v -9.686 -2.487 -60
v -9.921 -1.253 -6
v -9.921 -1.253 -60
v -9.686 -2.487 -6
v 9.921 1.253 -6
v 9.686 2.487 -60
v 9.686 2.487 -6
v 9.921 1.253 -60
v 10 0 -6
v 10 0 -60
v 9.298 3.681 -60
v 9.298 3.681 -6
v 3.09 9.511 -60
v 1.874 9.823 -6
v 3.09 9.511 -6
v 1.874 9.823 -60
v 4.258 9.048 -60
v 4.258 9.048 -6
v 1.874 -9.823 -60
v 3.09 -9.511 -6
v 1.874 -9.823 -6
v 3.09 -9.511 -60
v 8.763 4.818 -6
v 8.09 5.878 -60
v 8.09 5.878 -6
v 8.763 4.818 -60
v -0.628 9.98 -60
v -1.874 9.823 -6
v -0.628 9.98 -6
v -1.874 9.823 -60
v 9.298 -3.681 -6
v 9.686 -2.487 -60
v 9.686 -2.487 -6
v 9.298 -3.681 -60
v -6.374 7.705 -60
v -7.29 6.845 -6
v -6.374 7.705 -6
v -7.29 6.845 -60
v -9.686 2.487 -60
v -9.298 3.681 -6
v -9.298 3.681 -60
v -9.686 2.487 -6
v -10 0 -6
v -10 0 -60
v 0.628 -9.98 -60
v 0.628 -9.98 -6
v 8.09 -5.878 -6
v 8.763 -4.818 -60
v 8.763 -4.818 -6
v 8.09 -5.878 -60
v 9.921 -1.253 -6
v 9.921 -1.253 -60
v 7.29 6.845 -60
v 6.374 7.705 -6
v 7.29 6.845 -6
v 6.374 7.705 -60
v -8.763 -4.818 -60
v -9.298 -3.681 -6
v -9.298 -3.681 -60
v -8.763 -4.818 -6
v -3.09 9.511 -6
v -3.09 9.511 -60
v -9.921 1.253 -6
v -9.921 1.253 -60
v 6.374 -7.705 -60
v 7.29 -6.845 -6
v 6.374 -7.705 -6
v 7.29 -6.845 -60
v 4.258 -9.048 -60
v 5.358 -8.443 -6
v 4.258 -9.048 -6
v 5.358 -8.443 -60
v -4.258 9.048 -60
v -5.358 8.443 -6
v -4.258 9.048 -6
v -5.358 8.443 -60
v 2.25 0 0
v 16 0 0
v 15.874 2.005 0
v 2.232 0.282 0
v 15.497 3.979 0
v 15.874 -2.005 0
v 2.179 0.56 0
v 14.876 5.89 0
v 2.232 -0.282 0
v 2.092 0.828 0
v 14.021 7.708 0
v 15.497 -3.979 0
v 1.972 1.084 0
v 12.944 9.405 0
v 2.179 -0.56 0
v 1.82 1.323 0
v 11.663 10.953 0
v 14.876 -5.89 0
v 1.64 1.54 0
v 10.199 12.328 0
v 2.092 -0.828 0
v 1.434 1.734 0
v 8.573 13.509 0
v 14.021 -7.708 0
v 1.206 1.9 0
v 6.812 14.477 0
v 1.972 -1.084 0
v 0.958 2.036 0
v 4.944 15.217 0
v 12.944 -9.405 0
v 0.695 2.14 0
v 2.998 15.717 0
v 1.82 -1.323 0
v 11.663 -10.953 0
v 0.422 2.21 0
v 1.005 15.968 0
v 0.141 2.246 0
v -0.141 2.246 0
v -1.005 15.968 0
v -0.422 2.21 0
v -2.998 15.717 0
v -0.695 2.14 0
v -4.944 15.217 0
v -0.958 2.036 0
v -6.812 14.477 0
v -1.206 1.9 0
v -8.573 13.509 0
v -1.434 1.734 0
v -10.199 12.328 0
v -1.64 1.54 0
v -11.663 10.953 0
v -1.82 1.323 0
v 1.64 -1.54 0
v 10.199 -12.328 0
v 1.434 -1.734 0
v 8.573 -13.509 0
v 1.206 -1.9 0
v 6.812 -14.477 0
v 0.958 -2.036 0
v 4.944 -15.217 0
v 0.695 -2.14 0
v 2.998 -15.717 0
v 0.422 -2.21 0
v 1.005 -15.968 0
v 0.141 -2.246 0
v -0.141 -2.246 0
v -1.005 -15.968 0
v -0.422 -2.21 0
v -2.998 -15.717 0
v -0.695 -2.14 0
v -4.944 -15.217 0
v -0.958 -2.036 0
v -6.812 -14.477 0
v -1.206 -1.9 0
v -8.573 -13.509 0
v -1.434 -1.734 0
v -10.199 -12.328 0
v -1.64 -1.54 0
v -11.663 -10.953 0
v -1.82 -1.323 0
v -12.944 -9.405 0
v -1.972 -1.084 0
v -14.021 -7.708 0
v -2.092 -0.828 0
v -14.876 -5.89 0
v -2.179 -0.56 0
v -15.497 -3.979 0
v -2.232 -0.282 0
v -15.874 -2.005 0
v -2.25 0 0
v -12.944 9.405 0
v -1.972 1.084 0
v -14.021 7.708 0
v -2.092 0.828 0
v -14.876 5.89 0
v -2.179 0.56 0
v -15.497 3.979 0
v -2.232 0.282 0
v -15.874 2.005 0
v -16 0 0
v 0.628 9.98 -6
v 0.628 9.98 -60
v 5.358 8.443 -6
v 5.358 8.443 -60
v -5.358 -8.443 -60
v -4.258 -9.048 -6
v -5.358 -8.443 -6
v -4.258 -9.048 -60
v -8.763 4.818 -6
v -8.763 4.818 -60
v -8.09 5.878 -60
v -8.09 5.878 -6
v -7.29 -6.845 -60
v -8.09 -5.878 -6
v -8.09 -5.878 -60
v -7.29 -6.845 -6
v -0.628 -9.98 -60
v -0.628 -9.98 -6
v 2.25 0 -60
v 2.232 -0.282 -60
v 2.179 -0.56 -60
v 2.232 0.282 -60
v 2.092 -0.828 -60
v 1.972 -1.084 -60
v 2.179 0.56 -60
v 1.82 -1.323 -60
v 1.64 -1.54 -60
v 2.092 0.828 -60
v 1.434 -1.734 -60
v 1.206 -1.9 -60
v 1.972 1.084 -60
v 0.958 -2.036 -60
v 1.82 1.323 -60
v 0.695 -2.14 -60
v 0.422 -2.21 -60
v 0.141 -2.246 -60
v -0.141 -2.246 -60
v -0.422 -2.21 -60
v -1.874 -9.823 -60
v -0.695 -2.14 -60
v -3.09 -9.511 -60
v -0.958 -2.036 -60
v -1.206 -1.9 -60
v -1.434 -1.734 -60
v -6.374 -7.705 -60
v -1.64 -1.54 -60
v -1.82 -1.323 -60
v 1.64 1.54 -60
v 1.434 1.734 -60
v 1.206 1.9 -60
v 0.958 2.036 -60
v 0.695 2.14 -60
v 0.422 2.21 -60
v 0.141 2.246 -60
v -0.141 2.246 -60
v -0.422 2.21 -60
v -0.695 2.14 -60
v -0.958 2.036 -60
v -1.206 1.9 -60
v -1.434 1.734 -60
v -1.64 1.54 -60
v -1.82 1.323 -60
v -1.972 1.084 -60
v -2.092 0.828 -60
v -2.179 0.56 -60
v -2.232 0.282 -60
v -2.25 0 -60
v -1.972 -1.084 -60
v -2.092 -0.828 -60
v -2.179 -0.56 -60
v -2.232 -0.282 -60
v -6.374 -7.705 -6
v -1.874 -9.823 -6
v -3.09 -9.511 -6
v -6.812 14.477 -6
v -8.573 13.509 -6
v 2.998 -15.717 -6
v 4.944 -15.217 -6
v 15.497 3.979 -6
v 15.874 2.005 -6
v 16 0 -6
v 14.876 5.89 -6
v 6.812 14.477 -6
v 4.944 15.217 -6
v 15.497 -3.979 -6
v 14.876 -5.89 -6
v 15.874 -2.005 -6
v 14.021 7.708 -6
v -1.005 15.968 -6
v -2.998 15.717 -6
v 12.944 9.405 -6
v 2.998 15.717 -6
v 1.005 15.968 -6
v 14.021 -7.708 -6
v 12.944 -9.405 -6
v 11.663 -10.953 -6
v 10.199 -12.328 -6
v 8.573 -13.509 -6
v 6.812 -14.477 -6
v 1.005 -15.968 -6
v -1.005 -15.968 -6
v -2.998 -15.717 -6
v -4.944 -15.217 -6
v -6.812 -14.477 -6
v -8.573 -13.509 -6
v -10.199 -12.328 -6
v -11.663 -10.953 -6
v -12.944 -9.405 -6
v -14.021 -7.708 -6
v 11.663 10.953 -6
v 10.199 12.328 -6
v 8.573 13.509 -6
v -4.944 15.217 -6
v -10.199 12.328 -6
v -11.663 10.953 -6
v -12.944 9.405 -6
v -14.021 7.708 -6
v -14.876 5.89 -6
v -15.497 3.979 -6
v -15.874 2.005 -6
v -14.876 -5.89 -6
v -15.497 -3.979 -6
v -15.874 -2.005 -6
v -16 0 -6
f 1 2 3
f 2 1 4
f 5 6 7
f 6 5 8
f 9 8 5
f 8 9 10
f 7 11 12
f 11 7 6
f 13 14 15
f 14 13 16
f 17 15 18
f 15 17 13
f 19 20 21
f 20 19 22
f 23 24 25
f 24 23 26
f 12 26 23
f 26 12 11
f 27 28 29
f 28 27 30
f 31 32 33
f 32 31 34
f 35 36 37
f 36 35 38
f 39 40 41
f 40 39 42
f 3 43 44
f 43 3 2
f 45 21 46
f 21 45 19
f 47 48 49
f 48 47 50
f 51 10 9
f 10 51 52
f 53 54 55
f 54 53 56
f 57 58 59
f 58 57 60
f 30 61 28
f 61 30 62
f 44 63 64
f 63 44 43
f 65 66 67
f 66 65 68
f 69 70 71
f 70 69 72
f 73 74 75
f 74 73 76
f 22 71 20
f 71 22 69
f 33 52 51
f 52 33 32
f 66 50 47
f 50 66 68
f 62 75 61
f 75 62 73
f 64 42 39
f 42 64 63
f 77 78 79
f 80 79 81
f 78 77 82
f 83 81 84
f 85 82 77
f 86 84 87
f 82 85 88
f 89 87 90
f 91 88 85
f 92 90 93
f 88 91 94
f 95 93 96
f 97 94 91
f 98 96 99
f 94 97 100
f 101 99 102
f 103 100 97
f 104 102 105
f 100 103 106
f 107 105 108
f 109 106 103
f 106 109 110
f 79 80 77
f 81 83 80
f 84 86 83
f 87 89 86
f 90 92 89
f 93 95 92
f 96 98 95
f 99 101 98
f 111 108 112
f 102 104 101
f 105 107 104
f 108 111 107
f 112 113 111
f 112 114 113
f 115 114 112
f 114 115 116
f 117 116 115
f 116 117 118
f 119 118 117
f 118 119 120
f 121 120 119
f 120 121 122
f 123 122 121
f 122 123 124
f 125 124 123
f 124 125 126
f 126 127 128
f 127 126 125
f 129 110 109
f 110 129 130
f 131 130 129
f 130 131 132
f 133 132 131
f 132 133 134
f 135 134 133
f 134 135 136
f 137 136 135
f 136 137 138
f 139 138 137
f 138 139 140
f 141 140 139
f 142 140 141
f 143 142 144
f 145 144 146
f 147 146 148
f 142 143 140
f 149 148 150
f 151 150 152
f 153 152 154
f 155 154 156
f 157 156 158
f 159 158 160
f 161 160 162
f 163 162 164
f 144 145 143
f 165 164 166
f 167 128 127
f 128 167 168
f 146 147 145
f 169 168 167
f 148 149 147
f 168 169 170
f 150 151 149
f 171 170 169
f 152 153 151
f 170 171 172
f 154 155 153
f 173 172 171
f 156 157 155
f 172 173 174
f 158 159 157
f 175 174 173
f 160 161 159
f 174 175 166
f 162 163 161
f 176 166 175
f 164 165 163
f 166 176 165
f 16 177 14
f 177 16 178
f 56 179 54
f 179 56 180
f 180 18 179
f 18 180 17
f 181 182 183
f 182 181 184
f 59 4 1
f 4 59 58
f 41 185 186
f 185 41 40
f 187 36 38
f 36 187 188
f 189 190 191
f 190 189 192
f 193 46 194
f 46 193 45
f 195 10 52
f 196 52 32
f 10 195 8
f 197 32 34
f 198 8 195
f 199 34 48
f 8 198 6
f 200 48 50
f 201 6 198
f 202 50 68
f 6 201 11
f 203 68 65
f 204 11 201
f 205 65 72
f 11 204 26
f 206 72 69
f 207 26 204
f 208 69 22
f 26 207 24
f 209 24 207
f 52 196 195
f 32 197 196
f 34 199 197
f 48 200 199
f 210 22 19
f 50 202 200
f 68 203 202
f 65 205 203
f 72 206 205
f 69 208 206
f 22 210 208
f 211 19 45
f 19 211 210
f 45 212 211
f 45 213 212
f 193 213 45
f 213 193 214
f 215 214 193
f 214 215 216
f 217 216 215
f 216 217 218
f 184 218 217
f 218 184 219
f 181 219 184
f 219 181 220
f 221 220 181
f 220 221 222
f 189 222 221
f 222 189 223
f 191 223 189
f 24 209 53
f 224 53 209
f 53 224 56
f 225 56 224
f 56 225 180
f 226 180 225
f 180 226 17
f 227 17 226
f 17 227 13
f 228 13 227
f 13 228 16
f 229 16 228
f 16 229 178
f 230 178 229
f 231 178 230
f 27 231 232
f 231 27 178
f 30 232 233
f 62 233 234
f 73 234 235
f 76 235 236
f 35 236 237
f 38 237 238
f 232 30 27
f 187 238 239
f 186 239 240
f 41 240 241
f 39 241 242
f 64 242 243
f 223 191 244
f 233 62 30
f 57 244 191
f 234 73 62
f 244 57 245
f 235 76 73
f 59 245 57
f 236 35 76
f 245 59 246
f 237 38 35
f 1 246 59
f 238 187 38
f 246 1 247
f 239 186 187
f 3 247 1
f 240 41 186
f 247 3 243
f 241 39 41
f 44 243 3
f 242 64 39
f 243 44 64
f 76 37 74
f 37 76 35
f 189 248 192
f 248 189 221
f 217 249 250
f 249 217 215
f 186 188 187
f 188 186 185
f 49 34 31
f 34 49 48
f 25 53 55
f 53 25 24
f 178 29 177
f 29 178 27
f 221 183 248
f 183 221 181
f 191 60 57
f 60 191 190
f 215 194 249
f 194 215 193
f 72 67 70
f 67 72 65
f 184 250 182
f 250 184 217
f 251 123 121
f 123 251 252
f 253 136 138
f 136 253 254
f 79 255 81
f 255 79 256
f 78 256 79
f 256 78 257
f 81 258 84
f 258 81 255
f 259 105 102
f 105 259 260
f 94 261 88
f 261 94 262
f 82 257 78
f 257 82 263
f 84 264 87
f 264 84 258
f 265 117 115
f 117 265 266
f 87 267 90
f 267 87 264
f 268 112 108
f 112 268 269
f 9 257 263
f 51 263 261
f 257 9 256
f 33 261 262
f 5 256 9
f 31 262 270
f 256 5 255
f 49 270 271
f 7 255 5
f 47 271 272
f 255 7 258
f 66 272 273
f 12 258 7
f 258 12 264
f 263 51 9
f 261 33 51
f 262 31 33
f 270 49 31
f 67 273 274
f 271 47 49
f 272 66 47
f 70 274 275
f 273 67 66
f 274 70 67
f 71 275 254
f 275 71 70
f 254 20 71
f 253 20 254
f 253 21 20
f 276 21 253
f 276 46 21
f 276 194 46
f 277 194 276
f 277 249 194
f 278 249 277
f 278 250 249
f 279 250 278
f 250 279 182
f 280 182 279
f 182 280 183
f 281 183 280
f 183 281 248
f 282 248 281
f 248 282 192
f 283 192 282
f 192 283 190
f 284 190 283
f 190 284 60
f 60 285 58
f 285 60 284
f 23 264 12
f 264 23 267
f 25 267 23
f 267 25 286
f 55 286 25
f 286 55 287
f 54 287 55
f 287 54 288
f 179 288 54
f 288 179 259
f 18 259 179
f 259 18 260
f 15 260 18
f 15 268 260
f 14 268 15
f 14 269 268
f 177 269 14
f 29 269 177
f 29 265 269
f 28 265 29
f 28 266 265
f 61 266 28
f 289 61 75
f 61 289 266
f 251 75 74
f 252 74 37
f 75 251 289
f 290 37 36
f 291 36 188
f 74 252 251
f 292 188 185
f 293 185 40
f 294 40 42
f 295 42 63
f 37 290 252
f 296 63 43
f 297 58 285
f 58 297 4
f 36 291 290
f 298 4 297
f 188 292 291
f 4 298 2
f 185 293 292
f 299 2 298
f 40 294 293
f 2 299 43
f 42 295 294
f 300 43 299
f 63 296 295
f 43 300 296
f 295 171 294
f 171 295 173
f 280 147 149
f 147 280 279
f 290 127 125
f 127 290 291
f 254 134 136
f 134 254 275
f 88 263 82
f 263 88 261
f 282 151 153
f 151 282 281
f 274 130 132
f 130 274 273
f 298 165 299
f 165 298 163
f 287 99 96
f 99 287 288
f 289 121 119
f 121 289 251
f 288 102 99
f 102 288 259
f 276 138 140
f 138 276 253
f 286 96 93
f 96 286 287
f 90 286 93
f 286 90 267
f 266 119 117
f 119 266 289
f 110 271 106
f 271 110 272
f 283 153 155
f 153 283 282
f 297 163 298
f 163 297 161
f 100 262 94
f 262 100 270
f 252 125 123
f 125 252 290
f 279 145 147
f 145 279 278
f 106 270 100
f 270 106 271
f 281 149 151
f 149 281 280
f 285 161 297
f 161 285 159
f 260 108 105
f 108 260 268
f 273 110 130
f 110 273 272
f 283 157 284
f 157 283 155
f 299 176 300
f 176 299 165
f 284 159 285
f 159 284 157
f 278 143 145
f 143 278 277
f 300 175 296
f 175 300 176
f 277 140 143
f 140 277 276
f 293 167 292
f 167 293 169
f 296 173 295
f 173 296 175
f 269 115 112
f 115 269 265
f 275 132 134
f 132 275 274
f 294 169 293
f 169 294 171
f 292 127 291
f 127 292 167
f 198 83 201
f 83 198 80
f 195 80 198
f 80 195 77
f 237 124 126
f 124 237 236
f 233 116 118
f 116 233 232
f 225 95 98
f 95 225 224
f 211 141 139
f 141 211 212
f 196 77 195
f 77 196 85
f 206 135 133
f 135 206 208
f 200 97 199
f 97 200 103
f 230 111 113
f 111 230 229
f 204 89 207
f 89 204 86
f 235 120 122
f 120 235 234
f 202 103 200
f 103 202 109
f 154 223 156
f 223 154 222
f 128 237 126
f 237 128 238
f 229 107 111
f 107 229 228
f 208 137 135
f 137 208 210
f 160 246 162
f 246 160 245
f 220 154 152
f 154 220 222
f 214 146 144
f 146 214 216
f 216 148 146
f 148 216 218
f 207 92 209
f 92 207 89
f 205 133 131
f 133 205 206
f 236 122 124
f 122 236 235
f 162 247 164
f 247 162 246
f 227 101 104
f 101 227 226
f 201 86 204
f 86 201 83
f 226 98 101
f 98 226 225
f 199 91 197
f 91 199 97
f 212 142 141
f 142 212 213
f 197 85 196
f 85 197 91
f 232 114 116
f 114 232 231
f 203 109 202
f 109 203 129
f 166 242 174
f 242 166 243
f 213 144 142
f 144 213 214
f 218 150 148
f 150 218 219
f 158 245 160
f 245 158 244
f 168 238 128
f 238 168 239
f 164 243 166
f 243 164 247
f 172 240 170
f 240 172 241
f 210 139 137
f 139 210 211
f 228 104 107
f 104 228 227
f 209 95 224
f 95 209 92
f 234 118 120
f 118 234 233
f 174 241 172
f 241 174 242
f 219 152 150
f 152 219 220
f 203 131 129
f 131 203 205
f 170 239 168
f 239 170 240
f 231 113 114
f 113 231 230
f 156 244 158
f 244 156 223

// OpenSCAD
$fn = 50;


difference() {
	union() {
		translate(v = [0, 0, -60.0000000000]) {
			cylinder(h = 60, r = 10.0000000000);
		}
		translate(v = [0, 0, -6.0000000000]) {
			cylinder(h = 6, r = 16.0000000000);
		}
	}
	union() {
		#translate(v = [0, 0, -60]) {
			cylinder(h = 60, r = 2.2500000000);
		}
	}
}
